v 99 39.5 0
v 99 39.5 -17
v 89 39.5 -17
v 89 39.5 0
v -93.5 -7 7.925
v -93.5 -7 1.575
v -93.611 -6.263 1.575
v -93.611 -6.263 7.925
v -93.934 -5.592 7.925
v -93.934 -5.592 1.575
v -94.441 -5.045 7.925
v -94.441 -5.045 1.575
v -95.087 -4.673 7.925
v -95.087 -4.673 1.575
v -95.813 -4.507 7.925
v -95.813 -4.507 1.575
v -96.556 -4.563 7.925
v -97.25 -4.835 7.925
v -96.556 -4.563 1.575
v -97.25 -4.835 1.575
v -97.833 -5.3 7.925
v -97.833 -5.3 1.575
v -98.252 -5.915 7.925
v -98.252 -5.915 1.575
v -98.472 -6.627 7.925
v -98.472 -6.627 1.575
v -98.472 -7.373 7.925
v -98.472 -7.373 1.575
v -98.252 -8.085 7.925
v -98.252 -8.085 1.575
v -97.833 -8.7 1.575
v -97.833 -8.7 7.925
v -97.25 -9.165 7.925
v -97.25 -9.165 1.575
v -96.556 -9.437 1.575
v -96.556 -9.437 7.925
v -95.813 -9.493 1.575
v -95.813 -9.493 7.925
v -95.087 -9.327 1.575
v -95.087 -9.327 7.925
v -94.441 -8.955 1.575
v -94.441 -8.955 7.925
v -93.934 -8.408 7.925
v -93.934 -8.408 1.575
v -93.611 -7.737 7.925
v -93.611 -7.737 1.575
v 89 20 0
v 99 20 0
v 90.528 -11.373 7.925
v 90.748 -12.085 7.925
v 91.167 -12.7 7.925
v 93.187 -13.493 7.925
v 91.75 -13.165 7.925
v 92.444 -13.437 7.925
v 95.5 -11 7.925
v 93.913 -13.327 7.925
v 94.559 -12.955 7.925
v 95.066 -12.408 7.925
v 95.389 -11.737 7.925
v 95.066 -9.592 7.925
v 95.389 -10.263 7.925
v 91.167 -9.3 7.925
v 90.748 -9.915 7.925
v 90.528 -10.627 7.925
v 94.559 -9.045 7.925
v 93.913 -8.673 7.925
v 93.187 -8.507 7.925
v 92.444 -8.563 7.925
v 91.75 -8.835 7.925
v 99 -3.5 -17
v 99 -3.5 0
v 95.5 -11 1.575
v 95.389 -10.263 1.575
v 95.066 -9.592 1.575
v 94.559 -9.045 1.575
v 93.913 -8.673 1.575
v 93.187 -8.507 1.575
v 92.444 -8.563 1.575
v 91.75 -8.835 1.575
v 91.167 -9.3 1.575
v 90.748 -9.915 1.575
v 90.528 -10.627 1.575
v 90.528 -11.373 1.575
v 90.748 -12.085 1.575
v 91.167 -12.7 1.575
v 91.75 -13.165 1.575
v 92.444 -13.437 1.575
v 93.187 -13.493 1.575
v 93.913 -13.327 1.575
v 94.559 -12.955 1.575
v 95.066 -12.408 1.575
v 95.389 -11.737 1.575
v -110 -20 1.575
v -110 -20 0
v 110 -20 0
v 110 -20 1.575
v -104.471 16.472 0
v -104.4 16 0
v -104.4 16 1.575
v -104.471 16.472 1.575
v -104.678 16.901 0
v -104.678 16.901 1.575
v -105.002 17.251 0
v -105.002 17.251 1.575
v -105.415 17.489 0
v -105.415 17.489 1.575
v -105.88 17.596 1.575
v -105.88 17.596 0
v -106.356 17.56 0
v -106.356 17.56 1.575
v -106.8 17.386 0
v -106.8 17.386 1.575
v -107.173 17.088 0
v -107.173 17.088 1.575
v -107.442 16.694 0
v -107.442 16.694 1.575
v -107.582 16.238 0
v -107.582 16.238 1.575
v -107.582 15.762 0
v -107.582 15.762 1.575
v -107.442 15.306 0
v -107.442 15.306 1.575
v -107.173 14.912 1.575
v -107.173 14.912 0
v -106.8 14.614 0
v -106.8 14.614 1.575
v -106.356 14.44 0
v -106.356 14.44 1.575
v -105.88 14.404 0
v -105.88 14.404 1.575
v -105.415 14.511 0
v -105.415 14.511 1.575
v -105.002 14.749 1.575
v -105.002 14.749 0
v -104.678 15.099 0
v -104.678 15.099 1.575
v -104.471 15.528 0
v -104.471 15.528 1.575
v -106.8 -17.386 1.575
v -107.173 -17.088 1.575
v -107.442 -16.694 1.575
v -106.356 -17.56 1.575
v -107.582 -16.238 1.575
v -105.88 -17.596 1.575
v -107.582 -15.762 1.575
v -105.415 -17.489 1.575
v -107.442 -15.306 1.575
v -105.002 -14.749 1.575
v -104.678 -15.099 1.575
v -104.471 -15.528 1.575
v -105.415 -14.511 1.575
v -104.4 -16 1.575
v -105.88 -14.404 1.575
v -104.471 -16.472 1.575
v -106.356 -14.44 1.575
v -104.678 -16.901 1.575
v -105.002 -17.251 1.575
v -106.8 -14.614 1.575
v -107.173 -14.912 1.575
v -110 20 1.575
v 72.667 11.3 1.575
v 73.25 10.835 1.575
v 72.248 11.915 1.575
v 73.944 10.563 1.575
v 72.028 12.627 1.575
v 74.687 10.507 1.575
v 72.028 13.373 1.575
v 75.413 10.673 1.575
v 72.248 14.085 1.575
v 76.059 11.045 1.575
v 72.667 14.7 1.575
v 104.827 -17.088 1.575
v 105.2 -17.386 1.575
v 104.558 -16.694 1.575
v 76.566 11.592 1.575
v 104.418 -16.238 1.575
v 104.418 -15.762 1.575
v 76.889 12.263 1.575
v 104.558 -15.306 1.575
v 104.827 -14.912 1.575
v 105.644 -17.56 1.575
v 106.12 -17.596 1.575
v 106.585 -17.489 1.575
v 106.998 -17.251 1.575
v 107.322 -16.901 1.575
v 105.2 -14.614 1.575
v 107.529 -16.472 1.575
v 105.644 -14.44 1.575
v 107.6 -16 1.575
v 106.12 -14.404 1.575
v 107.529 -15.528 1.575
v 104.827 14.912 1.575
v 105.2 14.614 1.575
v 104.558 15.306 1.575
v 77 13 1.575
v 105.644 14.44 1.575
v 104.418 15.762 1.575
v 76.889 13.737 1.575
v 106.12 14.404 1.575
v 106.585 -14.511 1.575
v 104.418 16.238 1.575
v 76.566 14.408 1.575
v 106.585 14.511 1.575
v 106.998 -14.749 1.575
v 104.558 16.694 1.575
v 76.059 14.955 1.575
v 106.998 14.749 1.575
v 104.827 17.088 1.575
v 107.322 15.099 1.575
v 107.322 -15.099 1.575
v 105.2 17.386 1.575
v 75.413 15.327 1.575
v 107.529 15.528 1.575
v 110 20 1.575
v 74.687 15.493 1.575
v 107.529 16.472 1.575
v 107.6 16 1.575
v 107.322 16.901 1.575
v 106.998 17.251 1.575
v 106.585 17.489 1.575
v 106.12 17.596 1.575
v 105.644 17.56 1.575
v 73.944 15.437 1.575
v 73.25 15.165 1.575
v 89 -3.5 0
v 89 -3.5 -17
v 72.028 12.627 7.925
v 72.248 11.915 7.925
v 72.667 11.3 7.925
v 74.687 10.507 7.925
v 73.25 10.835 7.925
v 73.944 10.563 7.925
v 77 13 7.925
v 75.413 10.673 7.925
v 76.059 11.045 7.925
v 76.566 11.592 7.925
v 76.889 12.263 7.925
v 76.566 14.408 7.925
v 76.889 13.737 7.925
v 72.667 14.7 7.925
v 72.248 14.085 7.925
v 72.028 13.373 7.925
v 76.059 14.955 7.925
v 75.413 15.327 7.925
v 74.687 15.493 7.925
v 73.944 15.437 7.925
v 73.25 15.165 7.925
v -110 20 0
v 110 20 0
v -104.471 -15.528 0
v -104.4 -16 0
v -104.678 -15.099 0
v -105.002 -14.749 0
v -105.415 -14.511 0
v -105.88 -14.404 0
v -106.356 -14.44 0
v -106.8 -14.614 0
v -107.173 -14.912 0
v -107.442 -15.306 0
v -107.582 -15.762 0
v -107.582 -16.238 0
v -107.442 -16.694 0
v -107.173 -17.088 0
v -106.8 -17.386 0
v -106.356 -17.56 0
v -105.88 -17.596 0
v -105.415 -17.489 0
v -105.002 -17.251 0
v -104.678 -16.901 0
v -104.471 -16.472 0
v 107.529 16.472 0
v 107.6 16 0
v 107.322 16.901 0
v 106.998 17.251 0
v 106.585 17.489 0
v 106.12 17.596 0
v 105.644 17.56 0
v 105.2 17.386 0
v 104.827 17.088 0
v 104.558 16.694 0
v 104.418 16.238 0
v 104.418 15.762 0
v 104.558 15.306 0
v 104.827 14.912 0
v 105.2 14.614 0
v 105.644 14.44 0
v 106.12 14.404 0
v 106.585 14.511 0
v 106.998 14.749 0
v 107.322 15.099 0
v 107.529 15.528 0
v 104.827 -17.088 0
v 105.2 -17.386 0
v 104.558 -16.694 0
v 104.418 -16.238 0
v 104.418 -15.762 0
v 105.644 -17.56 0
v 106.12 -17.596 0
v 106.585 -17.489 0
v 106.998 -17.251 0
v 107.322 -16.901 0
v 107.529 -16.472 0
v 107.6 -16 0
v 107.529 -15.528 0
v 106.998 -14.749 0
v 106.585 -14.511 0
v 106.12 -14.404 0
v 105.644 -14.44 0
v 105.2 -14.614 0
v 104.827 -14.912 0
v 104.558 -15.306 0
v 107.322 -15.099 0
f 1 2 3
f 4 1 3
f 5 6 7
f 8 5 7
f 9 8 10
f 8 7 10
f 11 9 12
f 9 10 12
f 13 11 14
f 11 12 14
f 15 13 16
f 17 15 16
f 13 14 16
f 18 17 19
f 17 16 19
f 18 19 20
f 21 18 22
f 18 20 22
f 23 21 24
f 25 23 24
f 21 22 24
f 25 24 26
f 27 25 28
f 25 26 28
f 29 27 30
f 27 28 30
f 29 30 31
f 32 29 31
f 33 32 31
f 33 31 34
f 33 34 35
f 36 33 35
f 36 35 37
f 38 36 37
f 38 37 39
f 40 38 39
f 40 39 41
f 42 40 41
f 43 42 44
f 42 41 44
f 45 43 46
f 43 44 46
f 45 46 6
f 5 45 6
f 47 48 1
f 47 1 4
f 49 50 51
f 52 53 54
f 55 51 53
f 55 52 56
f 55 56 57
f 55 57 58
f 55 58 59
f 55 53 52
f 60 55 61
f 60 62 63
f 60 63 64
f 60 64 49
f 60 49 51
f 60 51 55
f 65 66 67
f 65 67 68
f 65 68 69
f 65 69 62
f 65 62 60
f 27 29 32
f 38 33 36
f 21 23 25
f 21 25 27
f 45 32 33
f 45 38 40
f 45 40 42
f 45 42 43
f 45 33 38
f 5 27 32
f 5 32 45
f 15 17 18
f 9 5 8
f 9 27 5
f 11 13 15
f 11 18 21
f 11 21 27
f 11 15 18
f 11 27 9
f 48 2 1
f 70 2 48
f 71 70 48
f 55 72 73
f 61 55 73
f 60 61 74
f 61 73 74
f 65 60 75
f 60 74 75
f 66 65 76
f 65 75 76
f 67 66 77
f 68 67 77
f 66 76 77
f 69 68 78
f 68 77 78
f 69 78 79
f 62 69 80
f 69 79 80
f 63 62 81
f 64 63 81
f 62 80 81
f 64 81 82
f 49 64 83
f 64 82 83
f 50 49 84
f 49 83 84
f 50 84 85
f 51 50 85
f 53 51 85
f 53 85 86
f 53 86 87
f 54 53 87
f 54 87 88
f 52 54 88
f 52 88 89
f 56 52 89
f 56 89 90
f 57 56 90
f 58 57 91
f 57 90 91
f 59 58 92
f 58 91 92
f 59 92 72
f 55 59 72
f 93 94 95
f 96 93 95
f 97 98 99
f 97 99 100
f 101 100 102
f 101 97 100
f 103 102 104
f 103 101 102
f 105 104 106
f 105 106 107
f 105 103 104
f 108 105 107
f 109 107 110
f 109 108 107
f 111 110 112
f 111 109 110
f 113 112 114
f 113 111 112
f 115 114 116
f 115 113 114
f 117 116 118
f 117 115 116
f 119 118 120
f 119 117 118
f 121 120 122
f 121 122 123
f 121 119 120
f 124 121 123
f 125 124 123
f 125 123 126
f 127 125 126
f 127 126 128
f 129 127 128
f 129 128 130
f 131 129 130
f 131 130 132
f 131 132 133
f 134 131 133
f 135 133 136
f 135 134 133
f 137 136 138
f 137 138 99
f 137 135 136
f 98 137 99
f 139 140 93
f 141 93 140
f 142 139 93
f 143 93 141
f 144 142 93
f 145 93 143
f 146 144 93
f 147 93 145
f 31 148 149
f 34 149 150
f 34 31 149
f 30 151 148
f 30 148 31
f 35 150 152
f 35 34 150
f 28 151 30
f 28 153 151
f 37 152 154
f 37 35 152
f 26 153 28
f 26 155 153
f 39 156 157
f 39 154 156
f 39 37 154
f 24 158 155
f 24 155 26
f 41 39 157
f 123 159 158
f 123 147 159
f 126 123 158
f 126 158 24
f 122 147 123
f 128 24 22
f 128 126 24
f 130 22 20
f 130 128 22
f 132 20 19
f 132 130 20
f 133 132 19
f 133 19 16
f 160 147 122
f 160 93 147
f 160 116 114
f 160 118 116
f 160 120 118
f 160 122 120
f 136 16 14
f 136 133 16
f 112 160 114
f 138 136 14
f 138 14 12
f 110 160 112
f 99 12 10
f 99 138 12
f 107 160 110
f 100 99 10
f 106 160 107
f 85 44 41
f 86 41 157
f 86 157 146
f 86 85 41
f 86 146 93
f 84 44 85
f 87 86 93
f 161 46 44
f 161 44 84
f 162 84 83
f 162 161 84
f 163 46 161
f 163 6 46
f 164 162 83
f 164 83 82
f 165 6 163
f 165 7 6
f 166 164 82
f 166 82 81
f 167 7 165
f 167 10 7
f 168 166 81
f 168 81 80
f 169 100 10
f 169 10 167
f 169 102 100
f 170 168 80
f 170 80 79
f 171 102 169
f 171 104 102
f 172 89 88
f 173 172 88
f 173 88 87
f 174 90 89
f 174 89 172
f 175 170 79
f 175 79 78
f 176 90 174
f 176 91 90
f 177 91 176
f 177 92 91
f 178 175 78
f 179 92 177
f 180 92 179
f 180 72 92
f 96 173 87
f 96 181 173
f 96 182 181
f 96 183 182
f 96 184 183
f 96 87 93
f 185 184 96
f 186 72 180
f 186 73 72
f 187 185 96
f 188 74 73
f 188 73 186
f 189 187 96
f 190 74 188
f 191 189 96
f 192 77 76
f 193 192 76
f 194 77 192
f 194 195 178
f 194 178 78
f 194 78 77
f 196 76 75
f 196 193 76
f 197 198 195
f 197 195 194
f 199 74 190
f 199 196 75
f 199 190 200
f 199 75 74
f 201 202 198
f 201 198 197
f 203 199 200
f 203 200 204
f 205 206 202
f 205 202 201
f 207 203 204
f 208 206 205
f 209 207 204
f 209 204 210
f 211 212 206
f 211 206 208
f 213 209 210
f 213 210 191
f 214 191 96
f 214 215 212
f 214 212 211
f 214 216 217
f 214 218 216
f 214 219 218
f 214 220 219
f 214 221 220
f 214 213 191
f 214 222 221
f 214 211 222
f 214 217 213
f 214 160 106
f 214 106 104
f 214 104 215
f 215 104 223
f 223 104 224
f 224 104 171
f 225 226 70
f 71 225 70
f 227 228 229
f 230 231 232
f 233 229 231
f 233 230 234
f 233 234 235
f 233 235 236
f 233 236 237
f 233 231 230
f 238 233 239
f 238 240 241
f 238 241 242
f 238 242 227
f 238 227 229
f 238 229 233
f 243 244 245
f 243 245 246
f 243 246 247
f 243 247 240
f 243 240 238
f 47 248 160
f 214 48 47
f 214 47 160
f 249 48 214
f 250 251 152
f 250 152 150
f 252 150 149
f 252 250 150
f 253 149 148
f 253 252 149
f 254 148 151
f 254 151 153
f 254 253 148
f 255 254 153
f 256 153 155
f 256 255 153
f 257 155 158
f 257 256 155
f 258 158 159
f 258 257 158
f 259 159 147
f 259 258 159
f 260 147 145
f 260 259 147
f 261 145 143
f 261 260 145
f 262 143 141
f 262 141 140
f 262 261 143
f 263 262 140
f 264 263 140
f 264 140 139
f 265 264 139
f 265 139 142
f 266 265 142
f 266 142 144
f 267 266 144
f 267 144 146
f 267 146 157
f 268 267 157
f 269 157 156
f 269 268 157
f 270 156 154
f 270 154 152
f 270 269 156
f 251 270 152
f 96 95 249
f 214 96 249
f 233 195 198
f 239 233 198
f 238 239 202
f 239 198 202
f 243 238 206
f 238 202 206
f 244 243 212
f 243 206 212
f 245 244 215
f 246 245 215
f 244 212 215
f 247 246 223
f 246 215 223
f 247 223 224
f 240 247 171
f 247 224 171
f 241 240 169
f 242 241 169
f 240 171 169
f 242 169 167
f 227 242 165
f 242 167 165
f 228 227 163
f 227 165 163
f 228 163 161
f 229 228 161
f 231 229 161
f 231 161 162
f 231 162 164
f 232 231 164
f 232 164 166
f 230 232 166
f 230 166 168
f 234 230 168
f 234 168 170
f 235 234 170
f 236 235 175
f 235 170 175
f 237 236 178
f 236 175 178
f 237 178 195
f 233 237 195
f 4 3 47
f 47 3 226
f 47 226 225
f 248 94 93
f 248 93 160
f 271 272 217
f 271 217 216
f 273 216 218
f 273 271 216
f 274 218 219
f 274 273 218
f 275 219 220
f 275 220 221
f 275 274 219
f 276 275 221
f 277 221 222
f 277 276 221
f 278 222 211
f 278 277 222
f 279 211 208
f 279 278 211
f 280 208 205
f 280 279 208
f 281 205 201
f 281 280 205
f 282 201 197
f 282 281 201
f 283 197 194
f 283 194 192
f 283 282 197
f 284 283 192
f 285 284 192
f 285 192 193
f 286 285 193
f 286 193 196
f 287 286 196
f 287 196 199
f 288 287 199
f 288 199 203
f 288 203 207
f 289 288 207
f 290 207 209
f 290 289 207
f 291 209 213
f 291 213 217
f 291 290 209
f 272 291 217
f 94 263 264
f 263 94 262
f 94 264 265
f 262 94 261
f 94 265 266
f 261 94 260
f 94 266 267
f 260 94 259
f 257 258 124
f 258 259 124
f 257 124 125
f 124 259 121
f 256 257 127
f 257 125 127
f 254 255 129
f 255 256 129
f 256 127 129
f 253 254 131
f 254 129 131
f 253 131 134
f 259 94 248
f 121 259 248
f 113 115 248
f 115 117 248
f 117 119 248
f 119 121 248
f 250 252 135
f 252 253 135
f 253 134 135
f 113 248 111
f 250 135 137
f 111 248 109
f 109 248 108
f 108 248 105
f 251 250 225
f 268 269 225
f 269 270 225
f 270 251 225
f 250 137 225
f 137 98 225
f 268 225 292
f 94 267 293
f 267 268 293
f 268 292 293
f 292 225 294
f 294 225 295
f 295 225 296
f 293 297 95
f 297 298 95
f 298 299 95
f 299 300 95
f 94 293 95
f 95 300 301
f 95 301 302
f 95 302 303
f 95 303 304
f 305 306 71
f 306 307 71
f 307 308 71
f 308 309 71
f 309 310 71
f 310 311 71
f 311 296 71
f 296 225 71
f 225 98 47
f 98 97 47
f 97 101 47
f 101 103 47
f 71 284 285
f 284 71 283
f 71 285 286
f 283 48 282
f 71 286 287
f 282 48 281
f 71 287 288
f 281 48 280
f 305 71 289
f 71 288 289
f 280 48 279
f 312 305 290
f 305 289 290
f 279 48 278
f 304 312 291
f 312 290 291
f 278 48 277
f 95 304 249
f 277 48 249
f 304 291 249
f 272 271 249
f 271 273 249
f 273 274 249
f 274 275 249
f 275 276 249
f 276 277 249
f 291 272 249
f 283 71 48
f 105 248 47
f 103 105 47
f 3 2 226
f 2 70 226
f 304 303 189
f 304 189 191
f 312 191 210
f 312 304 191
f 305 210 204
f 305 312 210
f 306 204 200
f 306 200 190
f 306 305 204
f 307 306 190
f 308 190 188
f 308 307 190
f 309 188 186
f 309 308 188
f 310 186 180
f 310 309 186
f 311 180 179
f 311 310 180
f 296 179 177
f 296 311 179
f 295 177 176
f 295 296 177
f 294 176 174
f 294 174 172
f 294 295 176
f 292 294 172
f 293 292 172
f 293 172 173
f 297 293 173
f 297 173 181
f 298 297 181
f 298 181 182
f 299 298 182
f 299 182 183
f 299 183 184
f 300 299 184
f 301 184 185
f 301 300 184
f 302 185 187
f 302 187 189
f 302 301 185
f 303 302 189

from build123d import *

# Parameters (mm, degrees)
F0_W      = 220
F0_H      = 40
F0_R      = 1.6
F1_DEPTH  = 1.5748
F2_W      = 10
F2_H      = 23
F3_DEPTH  = 17
F3_FACE_W = 10
F3_FACE_H = 17
F4_DEPTH  = 20
F5_R      = 2.5
F6_DEPTH  = 6.35


with BuildPart() as f1:
    # F0 (on Top) → F1 (new body)
    with BuildSketch(Plane.XY):
        Rectangle(F0_W, F0_H)
        with Locations((-106, -16)):
            Circle(F0_R, mode=Mode.SUBTRACT)
        with Locations((106, -16)):
            Circle(F0_R, mode=Mode.SUBTRACT)
        with Locations((-106, 16)):
            Circle(F0_R, mode=Mode.SUBTRACT)
        with Locations((106, 16)):
            Circle(F0_R, mode=Mode.SUBTRACT)
    extrude(amount=F1_DEPTH)

    # F2 (on face) → F3 (join)
    with BuildSketch(Plane(origin=(0, 0, 0), x_dir=(1, 0, 0), z_dir=(0, 0, -1))):
        with Locations((94, -8)):
            Rectangle(F2_W, F2_H)
    extrude(amount=F3_DEPTH)

    # F3_face (on face) → F4 (join)
    with BuildSketch(Plane(origin=(94, 19.5, -8.5), x_dir=(-1, 0, 0), z_dir=(0, 1, 0))):
        Rectangle(F3_FACE_W, F3_FACE_H)
    extrude(amount=F4_DEPTH)

    # F5 (on face) → F6 (join)
    with BuildSketch(Plane.XY.offset(1.5748)):
        with Locations((93, -11)):
            Circle(F5_R)
        with Locations((-96, -7)):
            Circle(F5_R)
        with Locations((74.5, 13)):
            Circle(F5_R)
    extrude(amount=F6_DEPTH)


solid = f1.part
